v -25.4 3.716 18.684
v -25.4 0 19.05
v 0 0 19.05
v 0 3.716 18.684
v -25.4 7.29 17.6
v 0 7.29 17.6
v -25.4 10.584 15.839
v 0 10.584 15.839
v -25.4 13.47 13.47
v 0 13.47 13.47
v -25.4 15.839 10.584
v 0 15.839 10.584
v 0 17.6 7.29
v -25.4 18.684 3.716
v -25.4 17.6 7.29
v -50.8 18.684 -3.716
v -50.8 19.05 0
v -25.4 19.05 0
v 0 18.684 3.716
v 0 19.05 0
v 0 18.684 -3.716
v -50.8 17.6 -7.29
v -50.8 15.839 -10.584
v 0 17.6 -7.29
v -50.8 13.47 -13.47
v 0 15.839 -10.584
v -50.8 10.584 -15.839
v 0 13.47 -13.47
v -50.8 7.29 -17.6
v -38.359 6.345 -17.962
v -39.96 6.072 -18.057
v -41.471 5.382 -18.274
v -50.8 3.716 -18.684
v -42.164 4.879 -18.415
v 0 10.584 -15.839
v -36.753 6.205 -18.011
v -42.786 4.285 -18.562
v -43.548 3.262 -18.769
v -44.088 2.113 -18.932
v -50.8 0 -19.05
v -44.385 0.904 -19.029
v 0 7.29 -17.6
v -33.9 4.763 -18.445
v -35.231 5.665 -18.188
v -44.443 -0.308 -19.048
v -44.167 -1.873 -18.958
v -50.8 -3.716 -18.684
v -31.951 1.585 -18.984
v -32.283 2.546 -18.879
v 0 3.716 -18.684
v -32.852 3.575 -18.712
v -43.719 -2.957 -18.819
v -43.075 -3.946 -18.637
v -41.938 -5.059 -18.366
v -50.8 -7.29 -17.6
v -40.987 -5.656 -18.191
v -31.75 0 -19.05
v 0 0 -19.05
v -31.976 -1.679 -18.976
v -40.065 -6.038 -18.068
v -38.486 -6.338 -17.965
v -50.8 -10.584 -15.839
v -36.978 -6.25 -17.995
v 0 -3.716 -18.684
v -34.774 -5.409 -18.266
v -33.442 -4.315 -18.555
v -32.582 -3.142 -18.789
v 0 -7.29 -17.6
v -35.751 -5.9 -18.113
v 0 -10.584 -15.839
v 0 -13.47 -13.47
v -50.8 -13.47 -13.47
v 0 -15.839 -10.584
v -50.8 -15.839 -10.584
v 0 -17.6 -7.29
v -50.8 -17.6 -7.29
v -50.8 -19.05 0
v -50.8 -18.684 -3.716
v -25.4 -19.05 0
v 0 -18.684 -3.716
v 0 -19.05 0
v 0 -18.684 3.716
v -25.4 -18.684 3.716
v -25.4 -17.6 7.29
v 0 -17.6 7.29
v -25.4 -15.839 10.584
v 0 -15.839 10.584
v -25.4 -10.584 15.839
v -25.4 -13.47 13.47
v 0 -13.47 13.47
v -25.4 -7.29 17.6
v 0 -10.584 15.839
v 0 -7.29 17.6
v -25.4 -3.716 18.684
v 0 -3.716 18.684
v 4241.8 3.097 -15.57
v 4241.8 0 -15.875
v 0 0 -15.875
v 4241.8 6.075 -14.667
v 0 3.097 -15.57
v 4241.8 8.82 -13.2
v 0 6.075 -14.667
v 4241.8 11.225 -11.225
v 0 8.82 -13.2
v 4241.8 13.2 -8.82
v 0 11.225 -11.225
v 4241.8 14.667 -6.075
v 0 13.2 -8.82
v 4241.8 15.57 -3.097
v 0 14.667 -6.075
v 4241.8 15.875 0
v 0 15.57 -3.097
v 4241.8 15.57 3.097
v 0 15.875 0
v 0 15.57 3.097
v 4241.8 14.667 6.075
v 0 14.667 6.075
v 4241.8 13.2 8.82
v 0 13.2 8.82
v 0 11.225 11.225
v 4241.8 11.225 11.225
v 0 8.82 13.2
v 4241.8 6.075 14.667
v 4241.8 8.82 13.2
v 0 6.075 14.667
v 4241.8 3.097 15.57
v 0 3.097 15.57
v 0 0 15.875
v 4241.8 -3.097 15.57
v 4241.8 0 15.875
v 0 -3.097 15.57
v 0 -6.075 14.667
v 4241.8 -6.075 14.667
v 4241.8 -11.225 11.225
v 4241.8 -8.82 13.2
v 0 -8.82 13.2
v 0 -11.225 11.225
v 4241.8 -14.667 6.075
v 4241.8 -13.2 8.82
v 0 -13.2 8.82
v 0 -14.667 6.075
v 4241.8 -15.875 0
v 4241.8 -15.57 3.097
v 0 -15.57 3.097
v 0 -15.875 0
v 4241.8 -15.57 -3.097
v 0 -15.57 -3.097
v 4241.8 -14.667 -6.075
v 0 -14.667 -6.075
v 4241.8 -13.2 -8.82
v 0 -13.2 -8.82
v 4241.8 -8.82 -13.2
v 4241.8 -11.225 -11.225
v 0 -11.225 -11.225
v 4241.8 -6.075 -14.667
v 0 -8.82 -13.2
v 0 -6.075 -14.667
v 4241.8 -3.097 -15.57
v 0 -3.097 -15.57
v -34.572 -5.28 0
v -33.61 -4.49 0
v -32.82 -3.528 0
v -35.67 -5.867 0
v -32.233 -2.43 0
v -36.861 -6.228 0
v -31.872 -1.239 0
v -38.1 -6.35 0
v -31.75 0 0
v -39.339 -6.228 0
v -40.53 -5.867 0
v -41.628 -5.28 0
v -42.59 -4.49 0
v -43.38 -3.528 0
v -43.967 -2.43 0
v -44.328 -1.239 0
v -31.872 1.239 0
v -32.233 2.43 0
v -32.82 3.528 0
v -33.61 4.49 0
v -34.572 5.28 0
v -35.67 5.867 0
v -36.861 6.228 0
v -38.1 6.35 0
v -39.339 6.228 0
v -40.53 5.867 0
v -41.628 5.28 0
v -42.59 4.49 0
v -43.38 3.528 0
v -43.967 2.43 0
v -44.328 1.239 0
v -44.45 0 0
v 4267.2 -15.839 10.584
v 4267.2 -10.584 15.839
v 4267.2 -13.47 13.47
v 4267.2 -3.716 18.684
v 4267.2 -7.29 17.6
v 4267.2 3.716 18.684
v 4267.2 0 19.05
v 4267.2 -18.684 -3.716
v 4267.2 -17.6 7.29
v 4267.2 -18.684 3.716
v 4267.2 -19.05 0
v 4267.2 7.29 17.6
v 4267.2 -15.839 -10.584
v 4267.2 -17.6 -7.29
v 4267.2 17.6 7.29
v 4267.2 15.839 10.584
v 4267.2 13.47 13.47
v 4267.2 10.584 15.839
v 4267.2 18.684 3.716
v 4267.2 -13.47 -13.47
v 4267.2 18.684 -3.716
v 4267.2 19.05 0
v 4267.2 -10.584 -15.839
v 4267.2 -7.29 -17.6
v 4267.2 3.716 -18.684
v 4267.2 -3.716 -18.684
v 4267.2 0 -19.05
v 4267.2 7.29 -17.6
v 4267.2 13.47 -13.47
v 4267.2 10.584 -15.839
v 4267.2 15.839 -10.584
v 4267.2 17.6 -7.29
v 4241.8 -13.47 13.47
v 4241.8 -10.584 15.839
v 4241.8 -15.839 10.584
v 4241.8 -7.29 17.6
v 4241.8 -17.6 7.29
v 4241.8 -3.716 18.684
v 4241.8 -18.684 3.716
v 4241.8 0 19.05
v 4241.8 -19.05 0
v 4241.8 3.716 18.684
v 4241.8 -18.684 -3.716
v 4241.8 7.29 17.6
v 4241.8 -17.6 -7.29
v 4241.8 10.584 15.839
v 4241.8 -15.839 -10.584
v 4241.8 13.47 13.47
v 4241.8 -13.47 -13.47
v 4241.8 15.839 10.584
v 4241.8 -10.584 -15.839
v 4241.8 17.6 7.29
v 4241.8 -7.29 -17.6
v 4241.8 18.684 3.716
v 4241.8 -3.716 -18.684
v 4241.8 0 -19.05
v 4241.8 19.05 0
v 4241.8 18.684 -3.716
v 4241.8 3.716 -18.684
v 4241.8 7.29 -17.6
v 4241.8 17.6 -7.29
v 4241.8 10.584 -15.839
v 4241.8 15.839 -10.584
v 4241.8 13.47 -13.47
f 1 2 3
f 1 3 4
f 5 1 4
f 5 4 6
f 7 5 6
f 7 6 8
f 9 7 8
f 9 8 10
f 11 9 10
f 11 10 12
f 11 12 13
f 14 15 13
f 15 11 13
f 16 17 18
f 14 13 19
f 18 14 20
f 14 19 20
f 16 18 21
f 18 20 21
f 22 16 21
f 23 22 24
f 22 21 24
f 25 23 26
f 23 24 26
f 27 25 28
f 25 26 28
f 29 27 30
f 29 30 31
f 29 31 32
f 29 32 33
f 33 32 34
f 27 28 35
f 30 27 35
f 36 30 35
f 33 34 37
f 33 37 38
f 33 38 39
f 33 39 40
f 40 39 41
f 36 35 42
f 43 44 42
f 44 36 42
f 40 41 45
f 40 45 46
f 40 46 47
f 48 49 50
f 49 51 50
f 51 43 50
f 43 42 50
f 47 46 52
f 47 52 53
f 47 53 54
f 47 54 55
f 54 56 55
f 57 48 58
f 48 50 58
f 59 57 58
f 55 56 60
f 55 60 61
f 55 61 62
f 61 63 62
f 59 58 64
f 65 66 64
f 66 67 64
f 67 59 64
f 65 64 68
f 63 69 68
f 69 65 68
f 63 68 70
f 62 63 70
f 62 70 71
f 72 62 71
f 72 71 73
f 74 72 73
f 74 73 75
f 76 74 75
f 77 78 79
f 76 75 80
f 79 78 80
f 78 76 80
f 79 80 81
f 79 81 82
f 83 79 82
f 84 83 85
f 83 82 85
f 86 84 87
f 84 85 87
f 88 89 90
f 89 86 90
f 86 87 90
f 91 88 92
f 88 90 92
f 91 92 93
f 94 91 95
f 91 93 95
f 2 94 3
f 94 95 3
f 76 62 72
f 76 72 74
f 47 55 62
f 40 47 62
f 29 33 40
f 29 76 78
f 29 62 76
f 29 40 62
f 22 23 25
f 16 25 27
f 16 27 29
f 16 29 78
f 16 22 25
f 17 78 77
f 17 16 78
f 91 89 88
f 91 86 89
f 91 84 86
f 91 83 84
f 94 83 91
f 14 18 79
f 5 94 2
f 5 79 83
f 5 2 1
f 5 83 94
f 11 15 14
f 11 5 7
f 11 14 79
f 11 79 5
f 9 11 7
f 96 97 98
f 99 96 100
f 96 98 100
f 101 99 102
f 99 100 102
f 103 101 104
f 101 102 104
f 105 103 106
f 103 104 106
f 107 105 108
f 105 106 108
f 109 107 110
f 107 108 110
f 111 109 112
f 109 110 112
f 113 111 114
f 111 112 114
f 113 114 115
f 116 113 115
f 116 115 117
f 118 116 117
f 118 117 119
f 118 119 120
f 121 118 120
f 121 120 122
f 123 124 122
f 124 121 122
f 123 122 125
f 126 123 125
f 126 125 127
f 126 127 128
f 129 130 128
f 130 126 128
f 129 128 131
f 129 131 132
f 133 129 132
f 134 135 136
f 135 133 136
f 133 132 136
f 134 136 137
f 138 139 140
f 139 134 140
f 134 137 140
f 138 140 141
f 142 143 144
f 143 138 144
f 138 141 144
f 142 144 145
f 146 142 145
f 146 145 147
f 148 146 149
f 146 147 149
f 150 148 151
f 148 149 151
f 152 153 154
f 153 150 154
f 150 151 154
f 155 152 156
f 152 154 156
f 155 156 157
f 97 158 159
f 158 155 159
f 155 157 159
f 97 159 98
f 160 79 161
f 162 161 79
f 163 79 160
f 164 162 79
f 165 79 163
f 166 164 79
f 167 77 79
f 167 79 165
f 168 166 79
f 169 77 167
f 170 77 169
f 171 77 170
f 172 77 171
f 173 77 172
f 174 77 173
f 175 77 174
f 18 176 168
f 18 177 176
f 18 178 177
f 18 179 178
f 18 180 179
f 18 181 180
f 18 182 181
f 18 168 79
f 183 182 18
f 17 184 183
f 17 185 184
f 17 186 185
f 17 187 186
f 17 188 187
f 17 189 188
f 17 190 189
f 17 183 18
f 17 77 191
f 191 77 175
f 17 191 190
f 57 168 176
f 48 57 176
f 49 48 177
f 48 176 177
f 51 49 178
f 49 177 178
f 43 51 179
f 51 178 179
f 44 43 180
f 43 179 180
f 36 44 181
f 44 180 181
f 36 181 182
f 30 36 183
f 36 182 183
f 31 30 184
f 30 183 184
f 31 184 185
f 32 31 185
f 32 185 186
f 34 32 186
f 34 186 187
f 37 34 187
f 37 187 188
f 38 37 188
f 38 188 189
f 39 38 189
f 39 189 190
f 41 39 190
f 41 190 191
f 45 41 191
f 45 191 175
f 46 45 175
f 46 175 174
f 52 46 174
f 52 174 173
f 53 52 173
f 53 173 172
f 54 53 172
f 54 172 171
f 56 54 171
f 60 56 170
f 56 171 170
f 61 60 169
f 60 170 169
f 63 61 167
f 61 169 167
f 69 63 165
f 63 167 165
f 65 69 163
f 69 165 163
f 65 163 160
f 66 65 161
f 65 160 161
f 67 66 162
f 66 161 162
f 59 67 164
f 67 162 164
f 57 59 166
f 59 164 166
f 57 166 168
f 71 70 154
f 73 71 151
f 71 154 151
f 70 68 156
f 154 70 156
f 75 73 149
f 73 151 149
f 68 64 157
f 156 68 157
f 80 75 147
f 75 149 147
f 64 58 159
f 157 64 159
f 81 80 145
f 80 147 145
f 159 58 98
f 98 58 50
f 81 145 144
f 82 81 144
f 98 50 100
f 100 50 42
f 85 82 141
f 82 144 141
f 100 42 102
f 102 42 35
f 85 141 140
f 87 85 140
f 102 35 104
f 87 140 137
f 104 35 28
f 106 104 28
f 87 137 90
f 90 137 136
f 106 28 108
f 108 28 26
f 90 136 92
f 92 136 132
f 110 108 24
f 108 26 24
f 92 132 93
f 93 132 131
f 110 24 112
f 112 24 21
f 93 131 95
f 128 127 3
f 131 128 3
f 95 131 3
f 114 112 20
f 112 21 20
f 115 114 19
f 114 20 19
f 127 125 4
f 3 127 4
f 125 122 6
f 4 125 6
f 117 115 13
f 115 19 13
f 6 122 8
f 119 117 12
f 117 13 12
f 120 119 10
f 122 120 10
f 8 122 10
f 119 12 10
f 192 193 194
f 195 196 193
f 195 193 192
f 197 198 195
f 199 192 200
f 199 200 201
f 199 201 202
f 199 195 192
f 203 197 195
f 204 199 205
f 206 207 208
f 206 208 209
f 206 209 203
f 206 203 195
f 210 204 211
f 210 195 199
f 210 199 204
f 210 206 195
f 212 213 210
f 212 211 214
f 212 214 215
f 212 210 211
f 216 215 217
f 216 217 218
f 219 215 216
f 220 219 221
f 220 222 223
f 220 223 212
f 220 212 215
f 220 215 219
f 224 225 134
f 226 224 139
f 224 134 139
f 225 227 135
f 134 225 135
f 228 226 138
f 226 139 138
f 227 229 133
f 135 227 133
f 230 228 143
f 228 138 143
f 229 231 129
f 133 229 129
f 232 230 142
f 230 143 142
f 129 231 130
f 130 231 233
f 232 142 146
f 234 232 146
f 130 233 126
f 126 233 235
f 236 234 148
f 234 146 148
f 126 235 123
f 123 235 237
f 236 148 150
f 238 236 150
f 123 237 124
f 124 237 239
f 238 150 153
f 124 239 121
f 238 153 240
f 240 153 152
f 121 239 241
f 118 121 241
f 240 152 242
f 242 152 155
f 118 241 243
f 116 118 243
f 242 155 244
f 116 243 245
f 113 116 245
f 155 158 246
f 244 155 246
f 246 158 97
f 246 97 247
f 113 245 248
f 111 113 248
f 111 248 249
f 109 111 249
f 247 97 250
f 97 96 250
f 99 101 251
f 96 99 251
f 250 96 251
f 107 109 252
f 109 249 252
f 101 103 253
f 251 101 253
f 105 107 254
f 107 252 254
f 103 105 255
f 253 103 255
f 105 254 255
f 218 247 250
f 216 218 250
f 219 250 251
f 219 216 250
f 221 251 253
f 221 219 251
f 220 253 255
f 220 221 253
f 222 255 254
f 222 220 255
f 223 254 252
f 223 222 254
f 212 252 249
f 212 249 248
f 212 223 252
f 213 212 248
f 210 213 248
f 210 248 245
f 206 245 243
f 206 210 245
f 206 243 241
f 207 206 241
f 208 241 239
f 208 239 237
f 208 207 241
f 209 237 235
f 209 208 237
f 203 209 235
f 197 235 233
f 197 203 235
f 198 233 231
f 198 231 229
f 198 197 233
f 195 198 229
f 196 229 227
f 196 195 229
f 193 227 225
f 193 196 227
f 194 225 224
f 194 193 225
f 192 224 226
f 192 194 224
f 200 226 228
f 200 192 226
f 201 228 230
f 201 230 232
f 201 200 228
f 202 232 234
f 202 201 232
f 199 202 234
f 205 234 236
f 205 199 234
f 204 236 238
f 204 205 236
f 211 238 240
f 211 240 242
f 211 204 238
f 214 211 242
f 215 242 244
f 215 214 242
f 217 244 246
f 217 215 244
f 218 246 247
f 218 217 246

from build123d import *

# Parameters (mm, degrees)
SKETCH1_R           = 15.875
BOSS_EXTRUDE1_DEPTH = 4267.2
SKETCH2_R           = 19.05
BOSS_EXTRUDE2_DEPTH = 25.4
SKETCH3_R           = 19.05
BOSS_EXTRUDE3_DEPTH = 50.8
SKETCH4_W           = 29.09743832
SKETCH4_H           = 50.636173691
CUT_EXTRUDE1_DEPTH  = 25.4
SKETCH5_R           = 6.35
CUT_EXTRUDE2_DEPTH  = 20.05


with BuildPart() as part:
    # Sketch1 → Boss-Extrude1 (new body)
    with BuildSketch(Plane(origin=(0, 0, 0), x_dir=(0, 0, -1), z_dir=(1, 0, 0))):
        Circle(SKETCH1_R)
    extrude(amount=BOSS_EXTRUDE1_DEPTH)

    # Sketch2 → Boss-Extrude2 (add)
    with BuildSketch(Plane(origin=(4267.2, 0, 0), x_dir=(0, 0, -1), z_dir=(1, 0, 0))):
        Circle(SKETCH2_R)
    extrude(amount=-BOSS_EXTRUDE2_DEPTH)

    # Sketch3 → Boss-Extrude3 (add)
    with BuildSketch(Plane.ZY):
        Circle(SKETCH3_R)
    extrude(amount=BOSS_EXTRUDE3_DEPTH)

    # Sketch4 → Cut-Extrude1 (cut)
    with BuildSketch(Plane.ZY.offset(50.8)):
        with Locations((14.54871916, 1.209789986)):
            Rectangle(SKETCH4_W, SKETCH4_H)
    extrude(amount=-CUT_EXTRUDE1_DEPTH, mode=Mode.SUBTRACT)

    # Sketch5 → Cut-Extrude2 (cut, through all)
    with BuildSketch(Plane.XY):
        with Locations((-38.1, 0)):
            Circle(SKETCH5_R)
    extrude(amount=-CUT_EXTRUDE2_DEPTH, mode=Mode.SUBTRACT)


solid = part.part
